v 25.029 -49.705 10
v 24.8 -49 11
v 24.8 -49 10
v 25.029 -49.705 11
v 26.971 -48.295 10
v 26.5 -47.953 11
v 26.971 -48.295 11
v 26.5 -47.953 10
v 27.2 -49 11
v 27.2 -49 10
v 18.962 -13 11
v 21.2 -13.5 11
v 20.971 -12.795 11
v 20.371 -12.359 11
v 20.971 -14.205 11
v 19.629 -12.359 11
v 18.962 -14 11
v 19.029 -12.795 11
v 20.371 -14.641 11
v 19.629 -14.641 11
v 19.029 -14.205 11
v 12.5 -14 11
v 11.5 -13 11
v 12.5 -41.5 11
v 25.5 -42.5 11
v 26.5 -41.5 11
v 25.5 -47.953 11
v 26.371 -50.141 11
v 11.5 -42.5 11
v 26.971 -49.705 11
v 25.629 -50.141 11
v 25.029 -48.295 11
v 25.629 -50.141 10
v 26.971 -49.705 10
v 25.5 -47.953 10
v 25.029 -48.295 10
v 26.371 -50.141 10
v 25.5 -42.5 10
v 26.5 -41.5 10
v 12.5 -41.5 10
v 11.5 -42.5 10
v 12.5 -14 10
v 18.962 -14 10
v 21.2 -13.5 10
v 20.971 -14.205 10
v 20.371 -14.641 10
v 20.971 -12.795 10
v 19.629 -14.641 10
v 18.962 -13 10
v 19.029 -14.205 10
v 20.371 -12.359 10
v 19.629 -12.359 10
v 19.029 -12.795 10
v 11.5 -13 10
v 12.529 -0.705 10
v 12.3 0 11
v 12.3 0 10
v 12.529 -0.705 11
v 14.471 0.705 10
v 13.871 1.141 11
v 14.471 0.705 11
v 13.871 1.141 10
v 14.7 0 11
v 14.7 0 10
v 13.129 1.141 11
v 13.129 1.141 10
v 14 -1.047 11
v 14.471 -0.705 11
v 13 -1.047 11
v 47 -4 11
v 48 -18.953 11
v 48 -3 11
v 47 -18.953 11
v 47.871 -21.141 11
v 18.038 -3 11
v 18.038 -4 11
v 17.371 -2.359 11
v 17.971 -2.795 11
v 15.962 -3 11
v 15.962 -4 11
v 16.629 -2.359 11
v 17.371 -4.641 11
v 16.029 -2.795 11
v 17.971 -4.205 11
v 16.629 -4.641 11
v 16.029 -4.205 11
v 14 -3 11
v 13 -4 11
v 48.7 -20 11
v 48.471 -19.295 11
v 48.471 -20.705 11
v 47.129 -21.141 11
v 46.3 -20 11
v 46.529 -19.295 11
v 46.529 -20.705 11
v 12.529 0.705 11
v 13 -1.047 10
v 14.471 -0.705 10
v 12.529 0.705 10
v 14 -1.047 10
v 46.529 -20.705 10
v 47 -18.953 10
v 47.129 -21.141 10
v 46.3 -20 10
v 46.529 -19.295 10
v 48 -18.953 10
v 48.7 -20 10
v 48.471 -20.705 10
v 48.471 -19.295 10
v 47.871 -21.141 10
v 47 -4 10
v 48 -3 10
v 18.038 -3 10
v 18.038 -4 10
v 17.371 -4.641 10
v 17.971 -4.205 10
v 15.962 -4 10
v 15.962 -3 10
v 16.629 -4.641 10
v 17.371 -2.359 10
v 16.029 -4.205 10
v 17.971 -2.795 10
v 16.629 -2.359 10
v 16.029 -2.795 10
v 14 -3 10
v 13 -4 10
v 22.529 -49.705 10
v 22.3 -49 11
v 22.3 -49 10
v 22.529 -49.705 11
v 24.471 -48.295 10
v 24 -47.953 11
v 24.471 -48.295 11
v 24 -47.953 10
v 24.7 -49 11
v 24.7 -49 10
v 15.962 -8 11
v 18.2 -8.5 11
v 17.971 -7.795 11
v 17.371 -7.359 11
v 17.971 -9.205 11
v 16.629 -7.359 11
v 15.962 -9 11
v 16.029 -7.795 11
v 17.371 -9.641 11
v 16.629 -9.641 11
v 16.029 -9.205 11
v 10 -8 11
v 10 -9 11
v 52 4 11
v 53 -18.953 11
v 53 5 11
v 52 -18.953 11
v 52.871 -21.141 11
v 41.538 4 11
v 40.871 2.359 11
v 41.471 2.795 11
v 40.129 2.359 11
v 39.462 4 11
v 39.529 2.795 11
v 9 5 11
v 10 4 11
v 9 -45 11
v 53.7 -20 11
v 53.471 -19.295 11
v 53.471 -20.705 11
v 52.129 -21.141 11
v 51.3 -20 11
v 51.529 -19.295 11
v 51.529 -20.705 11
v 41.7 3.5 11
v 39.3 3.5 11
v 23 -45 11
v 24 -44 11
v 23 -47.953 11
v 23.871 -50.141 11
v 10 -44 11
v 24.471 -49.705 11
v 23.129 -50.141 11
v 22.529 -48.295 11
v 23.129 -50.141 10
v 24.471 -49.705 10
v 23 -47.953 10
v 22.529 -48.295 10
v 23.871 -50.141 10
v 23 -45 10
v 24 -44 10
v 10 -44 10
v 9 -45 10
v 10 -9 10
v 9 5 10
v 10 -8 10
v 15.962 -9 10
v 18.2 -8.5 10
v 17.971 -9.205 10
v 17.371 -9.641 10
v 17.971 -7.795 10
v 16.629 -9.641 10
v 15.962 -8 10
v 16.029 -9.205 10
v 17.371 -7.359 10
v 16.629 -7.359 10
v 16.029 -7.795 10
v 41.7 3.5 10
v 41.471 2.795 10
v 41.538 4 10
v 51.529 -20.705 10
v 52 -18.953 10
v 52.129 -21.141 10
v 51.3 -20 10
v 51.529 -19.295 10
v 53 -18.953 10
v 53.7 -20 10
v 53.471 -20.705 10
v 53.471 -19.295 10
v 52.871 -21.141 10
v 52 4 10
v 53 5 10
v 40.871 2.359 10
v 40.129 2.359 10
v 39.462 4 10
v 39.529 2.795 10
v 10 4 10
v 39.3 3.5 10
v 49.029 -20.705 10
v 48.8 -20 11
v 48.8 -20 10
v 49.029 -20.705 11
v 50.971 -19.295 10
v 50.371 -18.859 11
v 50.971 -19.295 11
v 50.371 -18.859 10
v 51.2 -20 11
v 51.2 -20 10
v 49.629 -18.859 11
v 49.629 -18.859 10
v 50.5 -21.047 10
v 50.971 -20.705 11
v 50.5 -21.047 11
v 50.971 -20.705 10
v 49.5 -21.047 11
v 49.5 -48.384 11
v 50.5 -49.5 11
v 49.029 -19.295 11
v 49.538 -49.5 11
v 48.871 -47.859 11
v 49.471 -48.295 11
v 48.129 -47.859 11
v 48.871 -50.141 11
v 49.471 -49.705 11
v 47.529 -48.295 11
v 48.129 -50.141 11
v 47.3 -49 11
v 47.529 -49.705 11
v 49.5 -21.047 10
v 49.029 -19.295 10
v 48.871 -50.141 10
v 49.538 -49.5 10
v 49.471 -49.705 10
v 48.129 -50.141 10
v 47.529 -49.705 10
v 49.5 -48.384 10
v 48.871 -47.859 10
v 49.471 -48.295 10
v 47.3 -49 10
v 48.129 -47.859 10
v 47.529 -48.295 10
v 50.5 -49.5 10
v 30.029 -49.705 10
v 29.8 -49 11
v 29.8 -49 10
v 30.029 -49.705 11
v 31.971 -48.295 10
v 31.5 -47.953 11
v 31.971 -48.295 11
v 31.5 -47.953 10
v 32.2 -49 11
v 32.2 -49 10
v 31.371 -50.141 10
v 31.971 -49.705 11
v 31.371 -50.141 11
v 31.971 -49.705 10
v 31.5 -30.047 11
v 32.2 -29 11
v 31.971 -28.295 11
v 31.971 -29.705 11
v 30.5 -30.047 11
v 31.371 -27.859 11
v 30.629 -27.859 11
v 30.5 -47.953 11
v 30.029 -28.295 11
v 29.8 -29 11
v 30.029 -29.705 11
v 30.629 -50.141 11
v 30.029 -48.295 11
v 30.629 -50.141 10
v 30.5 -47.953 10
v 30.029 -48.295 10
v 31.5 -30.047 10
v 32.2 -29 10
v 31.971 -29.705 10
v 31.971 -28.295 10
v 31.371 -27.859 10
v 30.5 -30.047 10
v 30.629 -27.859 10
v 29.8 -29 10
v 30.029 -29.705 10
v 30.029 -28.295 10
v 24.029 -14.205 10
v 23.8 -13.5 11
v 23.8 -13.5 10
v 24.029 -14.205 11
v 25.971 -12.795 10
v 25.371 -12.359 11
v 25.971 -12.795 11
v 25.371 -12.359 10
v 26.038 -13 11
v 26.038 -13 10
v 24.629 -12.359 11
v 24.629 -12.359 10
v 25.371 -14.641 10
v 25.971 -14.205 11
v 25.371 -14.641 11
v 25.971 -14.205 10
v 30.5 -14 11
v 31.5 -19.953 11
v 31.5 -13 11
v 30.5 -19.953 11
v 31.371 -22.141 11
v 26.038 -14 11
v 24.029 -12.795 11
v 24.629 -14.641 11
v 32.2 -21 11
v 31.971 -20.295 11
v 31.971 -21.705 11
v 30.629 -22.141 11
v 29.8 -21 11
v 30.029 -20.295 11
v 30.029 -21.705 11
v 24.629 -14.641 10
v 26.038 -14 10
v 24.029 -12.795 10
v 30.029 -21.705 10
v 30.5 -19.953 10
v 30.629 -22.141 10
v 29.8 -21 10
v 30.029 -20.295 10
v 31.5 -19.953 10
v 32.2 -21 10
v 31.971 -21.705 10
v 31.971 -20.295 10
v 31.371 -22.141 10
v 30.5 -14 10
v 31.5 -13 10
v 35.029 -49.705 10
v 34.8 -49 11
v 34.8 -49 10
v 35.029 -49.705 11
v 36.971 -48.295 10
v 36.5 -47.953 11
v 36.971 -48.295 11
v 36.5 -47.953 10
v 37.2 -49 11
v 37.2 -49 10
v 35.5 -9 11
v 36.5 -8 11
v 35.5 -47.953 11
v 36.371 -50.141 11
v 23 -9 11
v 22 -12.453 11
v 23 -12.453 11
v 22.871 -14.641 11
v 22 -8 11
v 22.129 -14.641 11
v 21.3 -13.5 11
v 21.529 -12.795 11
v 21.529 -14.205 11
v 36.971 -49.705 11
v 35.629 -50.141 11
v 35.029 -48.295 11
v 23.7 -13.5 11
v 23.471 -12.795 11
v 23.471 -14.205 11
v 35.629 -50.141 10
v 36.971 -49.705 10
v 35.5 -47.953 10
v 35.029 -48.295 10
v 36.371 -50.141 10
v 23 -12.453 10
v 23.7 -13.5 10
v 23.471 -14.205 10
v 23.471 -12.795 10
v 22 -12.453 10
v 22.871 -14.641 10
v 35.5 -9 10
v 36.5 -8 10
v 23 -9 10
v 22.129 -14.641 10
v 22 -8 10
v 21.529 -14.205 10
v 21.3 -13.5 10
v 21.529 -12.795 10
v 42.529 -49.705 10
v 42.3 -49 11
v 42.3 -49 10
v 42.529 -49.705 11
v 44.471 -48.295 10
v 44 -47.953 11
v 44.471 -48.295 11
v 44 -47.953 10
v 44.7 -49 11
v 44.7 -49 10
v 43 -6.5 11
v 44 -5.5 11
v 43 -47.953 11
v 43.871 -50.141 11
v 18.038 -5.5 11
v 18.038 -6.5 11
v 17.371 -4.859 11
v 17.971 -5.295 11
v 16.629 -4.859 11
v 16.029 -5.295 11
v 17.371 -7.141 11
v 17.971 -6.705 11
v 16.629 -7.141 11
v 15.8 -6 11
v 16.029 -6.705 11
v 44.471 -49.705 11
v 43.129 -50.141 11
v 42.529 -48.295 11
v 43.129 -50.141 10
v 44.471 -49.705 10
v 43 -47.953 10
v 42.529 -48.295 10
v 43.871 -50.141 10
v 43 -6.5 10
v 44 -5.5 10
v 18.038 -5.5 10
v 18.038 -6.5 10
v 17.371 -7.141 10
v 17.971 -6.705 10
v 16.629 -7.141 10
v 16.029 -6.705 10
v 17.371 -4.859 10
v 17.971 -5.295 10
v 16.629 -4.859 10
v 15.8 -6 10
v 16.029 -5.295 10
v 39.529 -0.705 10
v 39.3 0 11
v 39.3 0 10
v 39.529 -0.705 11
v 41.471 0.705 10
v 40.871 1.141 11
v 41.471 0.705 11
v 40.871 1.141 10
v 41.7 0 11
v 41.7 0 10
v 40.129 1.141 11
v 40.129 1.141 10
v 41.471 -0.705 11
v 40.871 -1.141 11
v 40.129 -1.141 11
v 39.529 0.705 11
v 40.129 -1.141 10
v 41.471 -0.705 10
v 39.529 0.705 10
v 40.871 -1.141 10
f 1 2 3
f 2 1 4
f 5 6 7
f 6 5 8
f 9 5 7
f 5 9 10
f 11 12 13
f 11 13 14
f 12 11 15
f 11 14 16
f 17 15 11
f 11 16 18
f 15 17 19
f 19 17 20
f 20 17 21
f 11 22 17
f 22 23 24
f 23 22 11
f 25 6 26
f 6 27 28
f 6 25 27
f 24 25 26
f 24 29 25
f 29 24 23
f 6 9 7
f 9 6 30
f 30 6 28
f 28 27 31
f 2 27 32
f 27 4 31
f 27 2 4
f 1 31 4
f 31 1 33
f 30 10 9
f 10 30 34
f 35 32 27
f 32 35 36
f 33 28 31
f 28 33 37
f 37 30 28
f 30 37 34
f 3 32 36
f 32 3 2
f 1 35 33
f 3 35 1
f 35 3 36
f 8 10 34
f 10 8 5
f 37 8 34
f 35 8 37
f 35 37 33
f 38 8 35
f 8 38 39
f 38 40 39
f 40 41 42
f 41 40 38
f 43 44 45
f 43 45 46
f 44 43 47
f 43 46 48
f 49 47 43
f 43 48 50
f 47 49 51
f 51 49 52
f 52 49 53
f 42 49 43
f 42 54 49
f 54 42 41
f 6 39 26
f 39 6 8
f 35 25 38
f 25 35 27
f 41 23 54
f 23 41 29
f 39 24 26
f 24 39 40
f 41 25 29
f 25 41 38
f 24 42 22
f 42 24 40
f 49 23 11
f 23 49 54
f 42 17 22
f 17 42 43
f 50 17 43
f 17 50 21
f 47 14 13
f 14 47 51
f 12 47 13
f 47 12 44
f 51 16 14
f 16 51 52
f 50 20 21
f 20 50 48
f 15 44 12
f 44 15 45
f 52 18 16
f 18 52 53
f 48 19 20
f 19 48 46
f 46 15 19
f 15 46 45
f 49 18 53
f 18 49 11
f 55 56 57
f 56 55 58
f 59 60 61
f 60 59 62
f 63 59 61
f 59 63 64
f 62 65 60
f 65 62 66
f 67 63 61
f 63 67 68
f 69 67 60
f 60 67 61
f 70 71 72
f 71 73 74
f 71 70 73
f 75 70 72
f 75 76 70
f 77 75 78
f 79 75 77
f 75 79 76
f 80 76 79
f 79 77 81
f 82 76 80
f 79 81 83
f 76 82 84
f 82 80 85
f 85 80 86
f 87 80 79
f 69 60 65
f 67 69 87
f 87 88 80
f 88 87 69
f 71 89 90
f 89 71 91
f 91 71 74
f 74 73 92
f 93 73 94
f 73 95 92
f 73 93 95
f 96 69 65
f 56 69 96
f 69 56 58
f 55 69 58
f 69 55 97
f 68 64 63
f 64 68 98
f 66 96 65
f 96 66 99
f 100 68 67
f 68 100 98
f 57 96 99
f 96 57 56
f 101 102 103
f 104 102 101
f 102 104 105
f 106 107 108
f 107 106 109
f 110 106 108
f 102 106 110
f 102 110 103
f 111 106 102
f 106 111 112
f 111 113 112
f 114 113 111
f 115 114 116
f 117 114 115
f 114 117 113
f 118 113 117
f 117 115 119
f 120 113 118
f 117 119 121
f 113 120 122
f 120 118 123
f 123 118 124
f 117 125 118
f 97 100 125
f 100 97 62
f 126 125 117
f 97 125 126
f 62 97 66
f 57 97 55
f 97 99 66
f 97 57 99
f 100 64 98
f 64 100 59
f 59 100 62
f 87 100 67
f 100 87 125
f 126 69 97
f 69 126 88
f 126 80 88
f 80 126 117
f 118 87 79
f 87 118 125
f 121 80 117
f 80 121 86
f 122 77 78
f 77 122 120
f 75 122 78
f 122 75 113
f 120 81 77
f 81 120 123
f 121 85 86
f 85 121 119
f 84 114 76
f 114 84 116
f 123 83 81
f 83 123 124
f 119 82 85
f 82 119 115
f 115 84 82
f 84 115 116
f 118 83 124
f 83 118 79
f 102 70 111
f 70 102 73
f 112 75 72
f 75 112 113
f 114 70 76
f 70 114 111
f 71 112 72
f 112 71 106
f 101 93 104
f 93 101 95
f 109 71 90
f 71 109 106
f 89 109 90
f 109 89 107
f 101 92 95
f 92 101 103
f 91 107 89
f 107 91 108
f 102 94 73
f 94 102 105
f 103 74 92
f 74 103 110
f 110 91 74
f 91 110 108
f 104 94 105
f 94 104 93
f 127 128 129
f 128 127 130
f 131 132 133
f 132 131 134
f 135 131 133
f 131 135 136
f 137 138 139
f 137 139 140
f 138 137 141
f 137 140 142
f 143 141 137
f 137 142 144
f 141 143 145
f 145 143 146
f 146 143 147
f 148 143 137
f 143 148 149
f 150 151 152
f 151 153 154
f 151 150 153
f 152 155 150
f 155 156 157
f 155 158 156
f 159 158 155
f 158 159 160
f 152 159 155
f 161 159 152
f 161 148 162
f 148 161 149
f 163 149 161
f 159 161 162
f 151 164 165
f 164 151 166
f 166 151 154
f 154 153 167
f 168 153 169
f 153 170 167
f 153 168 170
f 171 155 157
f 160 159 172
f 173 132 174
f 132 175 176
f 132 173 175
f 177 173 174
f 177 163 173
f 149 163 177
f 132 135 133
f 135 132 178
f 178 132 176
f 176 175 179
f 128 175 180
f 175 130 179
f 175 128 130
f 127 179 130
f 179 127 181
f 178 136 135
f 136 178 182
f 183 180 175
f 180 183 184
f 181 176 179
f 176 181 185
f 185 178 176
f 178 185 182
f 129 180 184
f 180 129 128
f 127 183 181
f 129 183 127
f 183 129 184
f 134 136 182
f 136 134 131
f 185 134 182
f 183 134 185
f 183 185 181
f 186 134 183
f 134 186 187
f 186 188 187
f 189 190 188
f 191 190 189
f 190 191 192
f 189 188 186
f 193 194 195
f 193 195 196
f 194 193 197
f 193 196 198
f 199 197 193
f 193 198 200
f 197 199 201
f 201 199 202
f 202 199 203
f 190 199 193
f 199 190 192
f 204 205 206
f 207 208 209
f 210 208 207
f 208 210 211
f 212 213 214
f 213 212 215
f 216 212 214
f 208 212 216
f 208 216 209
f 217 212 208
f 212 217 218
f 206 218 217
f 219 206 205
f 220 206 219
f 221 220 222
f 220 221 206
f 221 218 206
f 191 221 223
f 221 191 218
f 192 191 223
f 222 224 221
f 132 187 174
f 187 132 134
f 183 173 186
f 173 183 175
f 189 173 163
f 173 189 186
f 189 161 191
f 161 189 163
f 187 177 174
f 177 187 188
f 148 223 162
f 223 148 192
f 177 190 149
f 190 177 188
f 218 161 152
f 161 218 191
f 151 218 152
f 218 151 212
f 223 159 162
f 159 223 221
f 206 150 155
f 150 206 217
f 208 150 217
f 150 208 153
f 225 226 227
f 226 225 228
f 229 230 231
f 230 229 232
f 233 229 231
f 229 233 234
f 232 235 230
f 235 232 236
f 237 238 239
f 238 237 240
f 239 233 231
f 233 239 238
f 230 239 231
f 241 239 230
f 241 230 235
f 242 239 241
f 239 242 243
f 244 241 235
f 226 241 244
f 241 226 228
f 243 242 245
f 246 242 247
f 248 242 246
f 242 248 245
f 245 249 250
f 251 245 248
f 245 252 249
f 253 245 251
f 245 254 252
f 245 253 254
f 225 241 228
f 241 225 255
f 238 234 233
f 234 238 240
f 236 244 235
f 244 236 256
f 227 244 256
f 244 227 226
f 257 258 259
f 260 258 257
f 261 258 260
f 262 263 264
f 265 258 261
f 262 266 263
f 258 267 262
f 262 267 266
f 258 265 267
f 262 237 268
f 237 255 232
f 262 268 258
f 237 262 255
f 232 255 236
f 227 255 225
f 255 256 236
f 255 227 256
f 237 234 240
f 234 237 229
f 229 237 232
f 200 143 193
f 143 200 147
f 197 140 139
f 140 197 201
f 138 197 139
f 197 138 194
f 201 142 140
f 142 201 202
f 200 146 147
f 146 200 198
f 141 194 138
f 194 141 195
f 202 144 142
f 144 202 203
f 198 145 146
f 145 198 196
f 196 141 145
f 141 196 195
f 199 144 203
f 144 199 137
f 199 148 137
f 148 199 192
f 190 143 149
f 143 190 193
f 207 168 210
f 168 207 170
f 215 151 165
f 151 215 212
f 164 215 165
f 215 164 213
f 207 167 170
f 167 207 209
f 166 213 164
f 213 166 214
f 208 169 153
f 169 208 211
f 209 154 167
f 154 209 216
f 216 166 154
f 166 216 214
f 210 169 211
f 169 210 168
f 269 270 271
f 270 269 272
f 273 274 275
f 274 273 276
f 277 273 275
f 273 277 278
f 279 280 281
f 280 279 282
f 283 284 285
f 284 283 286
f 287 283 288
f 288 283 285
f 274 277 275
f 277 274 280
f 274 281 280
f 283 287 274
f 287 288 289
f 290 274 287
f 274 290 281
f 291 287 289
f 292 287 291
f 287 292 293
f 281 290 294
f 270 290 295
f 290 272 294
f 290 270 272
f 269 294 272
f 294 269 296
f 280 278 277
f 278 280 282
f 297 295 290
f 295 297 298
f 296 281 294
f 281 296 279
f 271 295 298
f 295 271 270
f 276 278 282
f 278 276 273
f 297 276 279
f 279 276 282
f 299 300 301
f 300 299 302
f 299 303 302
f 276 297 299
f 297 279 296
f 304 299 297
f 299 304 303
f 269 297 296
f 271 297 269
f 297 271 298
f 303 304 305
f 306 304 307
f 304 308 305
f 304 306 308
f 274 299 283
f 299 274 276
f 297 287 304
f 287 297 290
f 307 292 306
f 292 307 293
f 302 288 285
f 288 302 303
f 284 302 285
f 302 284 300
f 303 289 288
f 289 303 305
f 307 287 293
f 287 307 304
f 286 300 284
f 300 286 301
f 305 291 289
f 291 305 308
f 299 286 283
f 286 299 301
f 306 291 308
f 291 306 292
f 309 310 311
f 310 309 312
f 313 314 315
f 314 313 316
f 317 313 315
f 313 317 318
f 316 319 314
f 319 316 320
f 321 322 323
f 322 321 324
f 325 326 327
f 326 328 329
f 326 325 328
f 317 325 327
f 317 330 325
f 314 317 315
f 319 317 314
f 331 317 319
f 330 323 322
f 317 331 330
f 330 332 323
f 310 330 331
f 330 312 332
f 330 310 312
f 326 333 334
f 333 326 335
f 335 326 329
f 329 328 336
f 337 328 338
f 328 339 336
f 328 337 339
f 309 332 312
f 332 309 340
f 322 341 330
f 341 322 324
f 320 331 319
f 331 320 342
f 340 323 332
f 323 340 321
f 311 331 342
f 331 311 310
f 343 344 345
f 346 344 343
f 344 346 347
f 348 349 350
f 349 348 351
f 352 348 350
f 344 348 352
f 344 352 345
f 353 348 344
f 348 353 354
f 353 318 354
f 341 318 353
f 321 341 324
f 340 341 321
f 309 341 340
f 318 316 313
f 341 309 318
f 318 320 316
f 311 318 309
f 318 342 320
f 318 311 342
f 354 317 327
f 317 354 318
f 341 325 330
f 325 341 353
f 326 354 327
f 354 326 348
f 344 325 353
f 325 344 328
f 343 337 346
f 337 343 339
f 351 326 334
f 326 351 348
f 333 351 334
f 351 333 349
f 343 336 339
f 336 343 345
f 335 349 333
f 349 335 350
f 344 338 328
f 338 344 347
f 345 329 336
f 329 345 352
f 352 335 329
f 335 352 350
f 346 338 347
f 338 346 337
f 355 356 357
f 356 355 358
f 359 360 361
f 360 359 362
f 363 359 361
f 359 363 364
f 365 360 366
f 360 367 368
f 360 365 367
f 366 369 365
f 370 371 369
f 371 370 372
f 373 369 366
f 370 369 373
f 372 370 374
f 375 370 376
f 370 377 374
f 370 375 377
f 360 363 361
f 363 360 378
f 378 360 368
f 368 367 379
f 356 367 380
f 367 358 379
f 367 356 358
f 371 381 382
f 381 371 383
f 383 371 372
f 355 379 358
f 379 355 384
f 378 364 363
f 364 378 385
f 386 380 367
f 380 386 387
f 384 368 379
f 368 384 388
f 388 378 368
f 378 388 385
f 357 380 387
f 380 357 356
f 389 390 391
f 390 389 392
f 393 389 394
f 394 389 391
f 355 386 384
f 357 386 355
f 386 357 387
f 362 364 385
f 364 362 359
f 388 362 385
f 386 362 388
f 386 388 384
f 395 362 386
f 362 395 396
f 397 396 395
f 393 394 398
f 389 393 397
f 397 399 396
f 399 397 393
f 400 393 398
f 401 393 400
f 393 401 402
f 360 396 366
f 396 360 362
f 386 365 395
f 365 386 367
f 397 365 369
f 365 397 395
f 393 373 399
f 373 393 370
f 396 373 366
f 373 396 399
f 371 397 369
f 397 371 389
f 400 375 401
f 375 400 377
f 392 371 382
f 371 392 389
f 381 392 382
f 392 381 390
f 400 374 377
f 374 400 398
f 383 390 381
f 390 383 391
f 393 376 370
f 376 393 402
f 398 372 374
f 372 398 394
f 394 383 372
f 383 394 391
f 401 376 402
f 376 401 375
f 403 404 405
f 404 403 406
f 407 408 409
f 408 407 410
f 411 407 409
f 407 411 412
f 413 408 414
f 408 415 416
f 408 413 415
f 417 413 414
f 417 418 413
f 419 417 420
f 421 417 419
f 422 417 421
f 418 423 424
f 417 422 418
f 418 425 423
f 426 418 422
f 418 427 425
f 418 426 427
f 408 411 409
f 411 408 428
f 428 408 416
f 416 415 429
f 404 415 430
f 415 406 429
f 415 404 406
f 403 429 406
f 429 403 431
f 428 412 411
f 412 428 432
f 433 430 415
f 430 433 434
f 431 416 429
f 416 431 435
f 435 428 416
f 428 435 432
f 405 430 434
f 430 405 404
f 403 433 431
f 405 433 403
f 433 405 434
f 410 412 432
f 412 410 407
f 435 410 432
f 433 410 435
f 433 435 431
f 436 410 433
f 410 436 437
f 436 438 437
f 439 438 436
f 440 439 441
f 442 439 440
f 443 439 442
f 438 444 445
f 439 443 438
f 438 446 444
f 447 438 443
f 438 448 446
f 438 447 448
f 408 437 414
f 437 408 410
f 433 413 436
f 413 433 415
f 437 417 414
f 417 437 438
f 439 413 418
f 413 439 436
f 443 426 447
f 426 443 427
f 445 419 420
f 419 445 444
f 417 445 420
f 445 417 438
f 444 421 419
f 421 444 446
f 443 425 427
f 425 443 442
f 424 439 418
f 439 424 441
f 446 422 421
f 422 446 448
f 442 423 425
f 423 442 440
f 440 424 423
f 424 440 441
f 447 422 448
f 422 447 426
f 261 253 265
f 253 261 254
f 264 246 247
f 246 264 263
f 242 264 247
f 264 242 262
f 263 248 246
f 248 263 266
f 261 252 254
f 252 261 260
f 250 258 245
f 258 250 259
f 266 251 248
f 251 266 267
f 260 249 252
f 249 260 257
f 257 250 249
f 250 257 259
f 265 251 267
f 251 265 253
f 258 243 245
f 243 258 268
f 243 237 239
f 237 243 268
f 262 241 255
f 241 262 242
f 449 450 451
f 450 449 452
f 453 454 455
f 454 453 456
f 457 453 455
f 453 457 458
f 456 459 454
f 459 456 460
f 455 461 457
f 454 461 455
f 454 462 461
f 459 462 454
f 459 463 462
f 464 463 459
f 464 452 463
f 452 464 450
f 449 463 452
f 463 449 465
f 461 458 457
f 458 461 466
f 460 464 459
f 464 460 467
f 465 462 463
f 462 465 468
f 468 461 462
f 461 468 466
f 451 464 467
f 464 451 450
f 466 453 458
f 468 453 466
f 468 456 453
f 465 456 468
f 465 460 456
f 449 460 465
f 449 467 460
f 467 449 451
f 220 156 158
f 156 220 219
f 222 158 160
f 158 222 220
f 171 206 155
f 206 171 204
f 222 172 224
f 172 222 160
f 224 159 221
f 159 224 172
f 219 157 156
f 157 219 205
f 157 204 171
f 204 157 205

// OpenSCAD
//include<ArduinoMp3Shield.scad>;

//Elementos a enlazar:
//LM35 5V, A3, GND
//BC107 Rele, A0, GND
//Rele Vin, BC107
//Potenciómetro 5V, resistencia, A5

//Nodo
module nodo()
{
cylinder(h=1, r=1.2, $fn=10);
}

//GND
color([0,0,1])union()
{
	translate([26, -49, 10]) nodo();
	translate([25.5, -49,10]) cube([1,7,1]);
	translate([11.5, -42.5,10]) cube([15,1,1]);
	translate([11.5, -42.5, 10]) cube([1,29,1]);
	translate([11.5,-14,10]) cube([8,1,1]);
	translate([20, -13.5, 10]) nodo();
	translate([13.5, 0, 10]) nodo();
	translate([13, -4, 10]) cube([1,4,1]);
	translate([13, -4, 10]) cube([4,1,1]);
	translate([17,-3.5,10]) nodo();
	translate([17,-4, 10]) cube([30,1,1]);
	translate([47,-20,10]) cube([1,17,1]);
	translate([47.5,-20,10]) nodo();
}

//5V
color([.8,0,0]) union()
{
	translate([23.5,-49,10]) nodo();
	translate([23,-49,10])cube([1,4,1]);
	translate([9,-45,10]) cube([15,1,1]);
	translate([9,-45,10]) cube([1,50,1]);
	translate([9,4,10]) cube([44,1,1]);
	translate([52,-20,10]) cube([1,25,1]);
	translate([50,-20,10]) nodo();	
	translate([17,-8.5,10]) nodo();
	translate([10,-9,10]) cube([7,1,1]);
	translate([52.5,-20,10]) nodo();
}

//Vin
	translate([31,-49,10]) nodo();
	translate([30.5, -49, 10]) cube([1,20,1]);
	translate([31, -29,10]) nodo();

	translate([25, -13.5 ,10]) nodo();
	translate([25,-14,10])  cube([6,1,1]);
	translate([30.5,-21,10]) cube([1,8,1]);
	translate([31, -21,10]) nodo();
//A0
	translate([36,-49,10]) nodo();
	translate([35.5,-49,10]) cube([1,40,1]);
	translate([22, -9, 10]) cube([14.5,1,1]);
	translate([22, -14, 10]) cube([1,5,1]);
	translate([22.5, -13.5 ,10]) nodo();


//A3
	translate([43.5,-49,10]) nodo();
	translate([43, -49, 10]) cube([1,43.5,1]);
	translate([17,-6.5,10]) cube([27,1,1]);
	translate([17,-6,10]) nodo();
	
//A5
	translate([48.5,-49,10]) nodo();
	translate([50,-20,10]) nodo();
	translate([48, -49.5, 10]) cube([2,1,1]);
	translate([49.5, -49.5, 10]) cube([1,29,1]);

//Pin3
translate([40.5,0,10]) nodo();
translate([40.5,3.5,10])color([1,0,0]) nodo();

//LM35
module LM35()
{
	for(i=[0:2])
	{
		translate([i*1.5,0,0]) cylinder(h=10, r=1/2, $fn=10);
	}
	translate([1.5,0,9])color([0,0,0]) cylinder(h=6, r=5/2);
}

//BC107
module BC107()
{
	for(i=[0:2])
	{
		translate([i*1.5,0,0]) cylinder(h=10, r=1/2, $fn=10);
	}
	translate([1.5,0,9])color([0.5,0.5,0.5]) cylinder(h=6, r=5/2);
}

//Rele
module rele()
{
	color([0,0,1]) cube([25,29,12]);
	translate([-5,2,3])rotate([0,90,0]) cylinder(h =5, r =0.5);
	translate([-5,2,9])rotate([0,90,0]) cylinder(h =5, r =0.5);
	translate([-5,23,9])rotate([0,90,0]) cylinder(h =5, r =0.5);
	translate([-5,26,3])rotate([0,90,0]) cylinder(h =5, r =0.5);
	translate([-5,20,3])rotate([0,90,0]) cylinder(h =5, r =0.5);
}

//Potenciometro
module pot()
{
	cylinder(h=12, r=24/2);
	translate([0,0,12]) cylinder(h=20, r=6/2);
}

//*********//
/*
translate([17,-7.5,10]) rotate([0,0,90]) LM35();
translate([21,-13.5,10]) BC107();
translate([33,-20,15]) rotate([0,-90,90])rele();
ArduinoMp3Shield(1,1,1);
*/
